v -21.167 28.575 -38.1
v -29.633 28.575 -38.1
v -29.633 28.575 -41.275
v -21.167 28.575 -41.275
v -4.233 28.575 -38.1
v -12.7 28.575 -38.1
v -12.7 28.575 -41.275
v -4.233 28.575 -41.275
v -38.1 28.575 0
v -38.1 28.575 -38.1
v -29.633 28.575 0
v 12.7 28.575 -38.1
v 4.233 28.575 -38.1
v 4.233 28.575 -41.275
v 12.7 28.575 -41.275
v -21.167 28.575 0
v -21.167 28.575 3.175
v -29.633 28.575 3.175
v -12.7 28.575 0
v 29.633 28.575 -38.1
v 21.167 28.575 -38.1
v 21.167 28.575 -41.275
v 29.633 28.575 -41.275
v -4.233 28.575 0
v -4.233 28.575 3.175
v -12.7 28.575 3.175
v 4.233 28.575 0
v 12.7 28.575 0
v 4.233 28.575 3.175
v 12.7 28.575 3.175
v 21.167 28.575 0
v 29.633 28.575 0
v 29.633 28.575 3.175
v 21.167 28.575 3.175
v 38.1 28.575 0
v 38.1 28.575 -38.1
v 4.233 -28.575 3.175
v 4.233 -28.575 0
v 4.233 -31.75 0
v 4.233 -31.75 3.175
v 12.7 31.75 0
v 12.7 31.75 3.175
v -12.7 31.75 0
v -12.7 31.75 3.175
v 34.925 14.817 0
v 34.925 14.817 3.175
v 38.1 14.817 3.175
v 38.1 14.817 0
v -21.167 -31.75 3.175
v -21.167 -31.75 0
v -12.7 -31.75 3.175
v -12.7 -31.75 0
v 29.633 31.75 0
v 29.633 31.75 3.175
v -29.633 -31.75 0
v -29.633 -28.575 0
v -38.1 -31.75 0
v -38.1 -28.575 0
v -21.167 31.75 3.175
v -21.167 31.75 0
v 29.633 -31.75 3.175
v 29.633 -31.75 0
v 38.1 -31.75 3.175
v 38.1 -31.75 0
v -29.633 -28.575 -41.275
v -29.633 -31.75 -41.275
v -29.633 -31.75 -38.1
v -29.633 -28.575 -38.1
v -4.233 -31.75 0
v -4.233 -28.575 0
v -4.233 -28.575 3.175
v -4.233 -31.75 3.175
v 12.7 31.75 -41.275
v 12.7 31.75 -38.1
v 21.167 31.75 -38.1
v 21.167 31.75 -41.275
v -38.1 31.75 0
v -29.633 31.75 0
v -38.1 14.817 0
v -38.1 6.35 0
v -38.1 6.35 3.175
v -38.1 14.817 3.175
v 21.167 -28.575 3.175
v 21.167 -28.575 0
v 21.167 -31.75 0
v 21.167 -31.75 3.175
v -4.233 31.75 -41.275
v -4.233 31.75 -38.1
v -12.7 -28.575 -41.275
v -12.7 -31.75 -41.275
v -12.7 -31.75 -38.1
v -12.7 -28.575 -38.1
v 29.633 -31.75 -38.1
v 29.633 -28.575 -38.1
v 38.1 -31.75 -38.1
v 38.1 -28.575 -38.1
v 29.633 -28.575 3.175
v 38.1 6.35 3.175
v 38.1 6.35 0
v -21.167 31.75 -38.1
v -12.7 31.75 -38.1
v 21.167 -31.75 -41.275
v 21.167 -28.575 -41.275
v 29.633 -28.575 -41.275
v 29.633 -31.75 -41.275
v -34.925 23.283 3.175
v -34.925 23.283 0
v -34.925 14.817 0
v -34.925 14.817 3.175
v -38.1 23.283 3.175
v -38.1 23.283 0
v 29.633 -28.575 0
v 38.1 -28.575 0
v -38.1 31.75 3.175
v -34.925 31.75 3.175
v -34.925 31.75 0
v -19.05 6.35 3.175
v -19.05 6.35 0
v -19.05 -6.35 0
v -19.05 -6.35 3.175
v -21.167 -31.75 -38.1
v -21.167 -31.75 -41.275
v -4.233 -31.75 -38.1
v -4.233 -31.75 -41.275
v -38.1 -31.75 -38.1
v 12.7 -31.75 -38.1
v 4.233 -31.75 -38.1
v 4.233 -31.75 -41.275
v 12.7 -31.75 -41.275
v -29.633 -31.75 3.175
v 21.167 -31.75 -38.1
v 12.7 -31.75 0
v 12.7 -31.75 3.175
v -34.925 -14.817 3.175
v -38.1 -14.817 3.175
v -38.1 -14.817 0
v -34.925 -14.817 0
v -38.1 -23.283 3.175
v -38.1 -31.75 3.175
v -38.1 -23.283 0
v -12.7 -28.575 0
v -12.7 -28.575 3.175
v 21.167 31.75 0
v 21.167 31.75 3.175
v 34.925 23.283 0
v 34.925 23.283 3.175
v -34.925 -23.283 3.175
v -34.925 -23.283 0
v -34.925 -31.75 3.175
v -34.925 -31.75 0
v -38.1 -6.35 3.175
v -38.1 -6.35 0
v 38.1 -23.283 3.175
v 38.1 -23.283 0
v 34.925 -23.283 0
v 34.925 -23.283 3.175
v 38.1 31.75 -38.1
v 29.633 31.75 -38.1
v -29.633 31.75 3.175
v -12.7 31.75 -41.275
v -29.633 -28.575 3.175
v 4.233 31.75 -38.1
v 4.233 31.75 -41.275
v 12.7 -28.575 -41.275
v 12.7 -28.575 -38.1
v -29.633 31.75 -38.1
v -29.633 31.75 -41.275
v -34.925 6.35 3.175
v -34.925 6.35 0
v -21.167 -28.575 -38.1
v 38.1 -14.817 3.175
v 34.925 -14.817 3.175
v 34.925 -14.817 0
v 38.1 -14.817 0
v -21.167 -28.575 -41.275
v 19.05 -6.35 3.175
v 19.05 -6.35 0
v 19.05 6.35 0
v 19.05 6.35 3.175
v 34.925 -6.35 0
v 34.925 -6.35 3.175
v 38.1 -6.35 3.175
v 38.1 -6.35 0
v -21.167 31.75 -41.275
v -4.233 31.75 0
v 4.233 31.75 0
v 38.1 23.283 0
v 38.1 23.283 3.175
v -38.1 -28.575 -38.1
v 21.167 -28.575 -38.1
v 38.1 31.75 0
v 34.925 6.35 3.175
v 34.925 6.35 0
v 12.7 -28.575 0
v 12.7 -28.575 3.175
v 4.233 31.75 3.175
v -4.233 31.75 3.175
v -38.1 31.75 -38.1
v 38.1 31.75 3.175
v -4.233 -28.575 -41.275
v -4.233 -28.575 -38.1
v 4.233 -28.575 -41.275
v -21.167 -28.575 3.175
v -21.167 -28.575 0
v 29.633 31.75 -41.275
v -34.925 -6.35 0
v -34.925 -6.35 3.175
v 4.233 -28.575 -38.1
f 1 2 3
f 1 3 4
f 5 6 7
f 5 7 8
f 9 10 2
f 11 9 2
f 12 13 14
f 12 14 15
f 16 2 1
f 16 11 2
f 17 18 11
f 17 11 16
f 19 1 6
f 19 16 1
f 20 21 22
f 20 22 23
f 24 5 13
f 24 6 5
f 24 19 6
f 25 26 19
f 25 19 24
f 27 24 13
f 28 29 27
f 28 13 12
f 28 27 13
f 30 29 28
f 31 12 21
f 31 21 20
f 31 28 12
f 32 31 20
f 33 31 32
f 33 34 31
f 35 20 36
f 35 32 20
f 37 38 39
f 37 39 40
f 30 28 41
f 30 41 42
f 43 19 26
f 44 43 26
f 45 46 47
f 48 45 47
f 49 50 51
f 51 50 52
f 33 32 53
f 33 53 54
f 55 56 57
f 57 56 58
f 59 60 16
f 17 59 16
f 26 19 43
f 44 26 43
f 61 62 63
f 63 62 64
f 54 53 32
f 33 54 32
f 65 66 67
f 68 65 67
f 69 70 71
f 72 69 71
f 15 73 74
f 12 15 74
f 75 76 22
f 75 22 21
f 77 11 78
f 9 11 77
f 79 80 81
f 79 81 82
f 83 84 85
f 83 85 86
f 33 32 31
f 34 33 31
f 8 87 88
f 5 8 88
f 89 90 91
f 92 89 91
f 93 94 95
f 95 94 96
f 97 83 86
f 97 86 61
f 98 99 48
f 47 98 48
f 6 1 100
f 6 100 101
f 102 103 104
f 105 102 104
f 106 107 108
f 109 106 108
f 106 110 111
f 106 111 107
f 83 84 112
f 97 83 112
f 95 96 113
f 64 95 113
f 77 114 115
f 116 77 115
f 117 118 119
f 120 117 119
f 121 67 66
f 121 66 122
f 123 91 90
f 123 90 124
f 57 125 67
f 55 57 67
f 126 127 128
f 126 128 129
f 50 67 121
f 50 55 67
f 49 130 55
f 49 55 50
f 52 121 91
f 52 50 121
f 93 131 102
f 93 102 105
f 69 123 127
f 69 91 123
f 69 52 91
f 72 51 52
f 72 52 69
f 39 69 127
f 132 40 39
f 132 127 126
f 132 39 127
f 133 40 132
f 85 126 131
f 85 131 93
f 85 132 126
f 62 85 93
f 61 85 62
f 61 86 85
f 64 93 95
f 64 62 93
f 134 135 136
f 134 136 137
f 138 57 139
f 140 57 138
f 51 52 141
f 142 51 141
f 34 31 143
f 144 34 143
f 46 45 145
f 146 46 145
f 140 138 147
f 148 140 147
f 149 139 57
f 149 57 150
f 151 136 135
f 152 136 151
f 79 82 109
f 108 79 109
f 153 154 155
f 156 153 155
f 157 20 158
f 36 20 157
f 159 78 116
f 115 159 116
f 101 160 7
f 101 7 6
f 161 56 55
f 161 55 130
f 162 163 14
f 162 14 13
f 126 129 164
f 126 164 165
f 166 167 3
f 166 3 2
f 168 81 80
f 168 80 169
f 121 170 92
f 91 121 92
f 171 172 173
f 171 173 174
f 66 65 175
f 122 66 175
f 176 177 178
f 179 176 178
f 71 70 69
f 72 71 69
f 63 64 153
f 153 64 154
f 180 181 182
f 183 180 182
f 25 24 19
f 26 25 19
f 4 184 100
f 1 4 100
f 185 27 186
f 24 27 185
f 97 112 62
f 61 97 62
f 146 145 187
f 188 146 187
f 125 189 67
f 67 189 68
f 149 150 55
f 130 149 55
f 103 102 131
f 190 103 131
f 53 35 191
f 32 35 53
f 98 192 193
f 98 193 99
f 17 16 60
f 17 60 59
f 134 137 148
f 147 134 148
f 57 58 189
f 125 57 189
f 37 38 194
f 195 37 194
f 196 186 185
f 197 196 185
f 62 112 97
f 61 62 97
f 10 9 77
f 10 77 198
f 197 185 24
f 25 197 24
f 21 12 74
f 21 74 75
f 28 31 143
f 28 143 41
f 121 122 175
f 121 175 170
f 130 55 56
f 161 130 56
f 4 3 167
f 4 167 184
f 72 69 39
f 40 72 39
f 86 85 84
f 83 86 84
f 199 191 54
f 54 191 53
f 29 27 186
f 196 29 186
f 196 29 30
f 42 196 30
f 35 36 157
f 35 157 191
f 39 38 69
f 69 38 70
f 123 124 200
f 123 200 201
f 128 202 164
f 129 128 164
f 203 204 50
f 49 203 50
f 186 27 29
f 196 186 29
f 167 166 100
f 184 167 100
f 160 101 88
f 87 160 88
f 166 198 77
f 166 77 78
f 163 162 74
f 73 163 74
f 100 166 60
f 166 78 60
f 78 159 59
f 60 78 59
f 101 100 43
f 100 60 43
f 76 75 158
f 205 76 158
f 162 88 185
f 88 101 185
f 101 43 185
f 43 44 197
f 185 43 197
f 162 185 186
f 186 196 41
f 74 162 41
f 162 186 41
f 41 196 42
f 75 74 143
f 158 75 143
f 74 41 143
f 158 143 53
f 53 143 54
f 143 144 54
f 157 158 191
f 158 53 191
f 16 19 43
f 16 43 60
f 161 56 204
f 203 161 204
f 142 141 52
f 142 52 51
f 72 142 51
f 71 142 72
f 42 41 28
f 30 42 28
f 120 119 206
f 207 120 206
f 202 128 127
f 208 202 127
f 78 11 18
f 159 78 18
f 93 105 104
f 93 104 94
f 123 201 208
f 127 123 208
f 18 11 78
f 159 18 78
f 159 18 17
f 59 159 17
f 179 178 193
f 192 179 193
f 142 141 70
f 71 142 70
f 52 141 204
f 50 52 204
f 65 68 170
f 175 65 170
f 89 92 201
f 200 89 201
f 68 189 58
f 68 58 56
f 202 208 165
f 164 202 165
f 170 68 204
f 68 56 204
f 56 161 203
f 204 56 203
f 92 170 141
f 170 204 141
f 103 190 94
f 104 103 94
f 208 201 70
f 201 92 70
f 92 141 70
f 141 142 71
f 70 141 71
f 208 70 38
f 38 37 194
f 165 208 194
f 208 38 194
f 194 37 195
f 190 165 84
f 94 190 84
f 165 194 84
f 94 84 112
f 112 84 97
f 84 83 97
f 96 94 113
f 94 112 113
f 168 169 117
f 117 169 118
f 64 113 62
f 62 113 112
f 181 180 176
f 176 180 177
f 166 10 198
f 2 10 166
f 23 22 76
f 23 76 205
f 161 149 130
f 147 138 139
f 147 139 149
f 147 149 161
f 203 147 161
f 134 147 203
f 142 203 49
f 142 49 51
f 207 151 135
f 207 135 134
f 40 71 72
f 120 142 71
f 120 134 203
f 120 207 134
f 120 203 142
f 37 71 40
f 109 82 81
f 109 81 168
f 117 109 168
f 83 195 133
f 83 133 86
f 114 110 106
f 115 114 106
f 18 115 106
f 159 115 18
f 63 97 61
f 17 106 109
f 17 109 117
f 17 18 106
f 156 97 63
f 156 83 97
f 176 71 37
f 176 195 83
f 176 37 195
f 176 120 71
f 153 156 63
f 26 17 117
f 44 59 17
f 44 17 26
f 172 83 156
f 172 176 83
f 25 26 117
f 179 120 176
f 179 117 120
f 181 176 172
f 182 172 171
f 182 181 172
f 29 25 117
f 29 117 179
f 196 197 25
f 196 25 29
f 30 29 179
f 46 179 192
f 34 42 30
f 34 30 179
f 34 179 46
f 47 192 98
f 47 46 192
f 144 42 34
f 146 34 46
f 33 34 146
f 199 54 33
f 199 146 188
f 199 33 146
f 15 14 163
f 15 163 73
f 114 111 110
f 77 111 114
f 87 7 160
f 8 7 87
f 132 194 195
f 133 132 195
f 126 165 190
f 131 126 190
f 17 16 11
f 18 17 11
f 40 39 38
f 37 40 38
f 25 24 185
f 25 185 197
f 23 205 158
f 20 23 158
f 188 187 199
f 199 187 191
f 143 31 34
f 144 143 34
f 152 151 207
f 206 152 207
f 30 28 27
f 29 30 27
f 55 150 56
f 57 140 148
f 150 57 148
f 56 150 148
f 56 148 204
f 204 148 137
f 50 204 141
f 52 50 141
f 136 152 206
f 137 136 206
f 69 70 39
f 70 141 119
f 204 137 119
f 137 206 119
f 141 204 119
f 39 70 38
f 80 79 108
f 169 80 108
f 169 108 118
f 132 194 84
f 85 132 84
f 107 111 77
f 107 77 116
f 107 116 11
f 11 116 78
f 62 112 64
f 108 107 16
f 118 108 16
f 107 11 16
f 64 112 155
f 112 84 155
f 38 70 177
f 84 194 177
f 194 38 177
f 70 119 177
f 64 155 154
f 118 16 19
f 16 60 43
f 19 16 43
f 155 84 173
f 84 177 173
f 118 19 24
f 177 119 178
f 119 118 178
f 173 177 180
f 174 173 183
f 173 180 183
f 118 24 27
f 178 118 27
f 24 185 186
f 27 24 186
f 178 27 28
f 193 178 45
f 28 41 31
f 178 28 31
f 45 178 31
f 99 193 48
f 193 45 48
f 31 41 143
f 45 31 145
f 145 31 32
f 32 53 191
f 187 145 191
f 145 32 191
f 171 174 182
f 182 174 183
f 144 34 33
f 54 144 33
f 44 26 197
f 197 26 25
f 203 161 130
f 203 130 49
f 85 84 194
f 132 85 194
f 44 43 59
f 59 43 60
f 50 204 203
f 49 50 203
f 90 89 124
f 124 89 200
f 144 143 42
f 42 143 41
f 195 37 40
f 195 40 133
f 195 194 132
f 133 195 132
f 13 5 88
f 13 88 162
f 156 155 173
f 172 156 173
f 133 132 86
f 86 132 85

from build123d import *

# Parameters (mm, degrees)
F0_W     = 3.175
F0_H     = 8.466667
F1_DEPTH = 3.175
F2_W     = 8.466666
F2_H     = 3.175
F2_W_2   = 8.466667
F3_DEPTH = 3.175


with BuildPart() as f1:
    # F0 (on Top) → F1 (new body)
    with BuildSketch(Plane.XY):
        Polygon((38.1, 28.575), (38.1, 31.75), (34.925, 31.75), (34.925, 23.283333), (38.1, 23.283333), align=None)
        Polygon((34.925, 23.283333), (34.925, 31.75), (29.633333, 31.75), (29.633333, 28.575), (21.166667, 28.575), (21.166667, 31.75), (12.7, 31.75), (12.7, 28.575), (4.233333, 28.575), (4.233333, 31.75), (-4.233333, 31.75), (-4.233333, 28.575), (-12.7, 28.575), (-12.7, 31.75), (-21.166667, 31.75), (-21.166667, 28.575), (-29.633333, 28.575), (-29.633333, 31.75), (-34.925, 31.75), (-34.925, 23.283333), (-34.925, 14.816667), (-34.925, 6.35), (-19.05, 6.35), (-19.05, -6.35), (-34.925, -6.35), (-34.925, -14.816667), (-34.925, -23.283333), (-34.925, -31.75), (-29.633333, -31.75), (-29.633333, -28.575), (-21.166667, -28.575), (-21.166667, -31.75), (-12.7, -31.75), (-12.7, -28.575), (-4.233333, -28.575), (-4.233333, -31.75), (4.233333, -31.75), (4.233333, -28.575), (12.7, -28.575), (12.7, -31.75), (21.166667, -31.75), (21.166667, -28.575), (29.633333, -28.575), (29.633333, -31.75), (34.925, -31.75), (34.925, -23.283333), (34.925, -14.816667), (34.925, -6.35), (19.05, -6.35), (19.05, 6.35), (34.925, 6.35), (34.925, 14.816667), align=None)
        with Locations((36.5125, 10.583333)):
            Rectangle(F0_W, F0_H)
        with Locations((36.5125, -10.583333)):
            Rectangle(F0_W, F0_H)
        Polygon((38.1, -23.283333), (34.925, -23.283333), (34.925, -31.75), (38.1, -31.75), (38.1, -28.575), align=None)
        with Locations((-36.5125, 27.516666)):
            Rectangle(F0_W, F0_H)
        with Locations((-36.5125, 10.583333)):
            Rectangle(F0_W, F0_H)
        with Locations((-36.5125, -10.583333)):
            Rectangle(F0_W, F0_H)
        with Locations((-36.5125, -27.516666)):
            Rectangle(F0_W, F0_H)
    extrude(amount=F1_DEPTH)


with BuildPart() as f3:
    # F2 (on face) → F3 (new body)
    with BuildSketch(Plane.XZ.offset(28.575)):
        with Locations((-25.4, -39.6875)):
            Rectangle(F2_W, F2_H)
        with Locations((-25.4, 1.5875)):
            Rectangle(F2_W, F2_H)
        with Locations((-8.466666, 1.5875)):
            Rectangle(F2_W_2, F2_H)
        with Locations((8.466666, 1.5875)):
            Rectangle(F2_W_2, F2_H)
        with Locations((25.4, 1.5875)):
            Rectangle(F2_W, F2_H)
        Polygon((-21.166667, 0), (-29.633333, 0), (-38.1, 0), (-38.1, -38.1), (-29.633333, -38.1), (-21.166667, -38.1), (-12.7, -38.1), (-4.233333, -38.1), (4.233333, -38.1), (12.7, -38.1), (21.166667, -38.1), (29.633333, -38.1), (38.1, -38.1), (38.1, 0), (29.633333, 0), (21.166667, 0), (12.7, 0), (4.233333, 0), (-4.233333, 0), (-12.7, 0), align=None)
        with Locations((-8.466666, -39.6875)):
            Rectangle(F2_W_2, F2_H)
        with Locations((8.466666, -39.6875)):
            Rectangle(F2_W_2, F2_H)
        with Locations((25.4, -39.6875)):
            Rectangle(F2_W, F2_H)
    extrude(amount=F3_DEPTH)


with BuildPart() as f4_1:
    # F4: instance of F3
    add(f3.part.mirror(Plane.XZ))


solid = Compound([f1.part, f3.part, f4_1.part])
